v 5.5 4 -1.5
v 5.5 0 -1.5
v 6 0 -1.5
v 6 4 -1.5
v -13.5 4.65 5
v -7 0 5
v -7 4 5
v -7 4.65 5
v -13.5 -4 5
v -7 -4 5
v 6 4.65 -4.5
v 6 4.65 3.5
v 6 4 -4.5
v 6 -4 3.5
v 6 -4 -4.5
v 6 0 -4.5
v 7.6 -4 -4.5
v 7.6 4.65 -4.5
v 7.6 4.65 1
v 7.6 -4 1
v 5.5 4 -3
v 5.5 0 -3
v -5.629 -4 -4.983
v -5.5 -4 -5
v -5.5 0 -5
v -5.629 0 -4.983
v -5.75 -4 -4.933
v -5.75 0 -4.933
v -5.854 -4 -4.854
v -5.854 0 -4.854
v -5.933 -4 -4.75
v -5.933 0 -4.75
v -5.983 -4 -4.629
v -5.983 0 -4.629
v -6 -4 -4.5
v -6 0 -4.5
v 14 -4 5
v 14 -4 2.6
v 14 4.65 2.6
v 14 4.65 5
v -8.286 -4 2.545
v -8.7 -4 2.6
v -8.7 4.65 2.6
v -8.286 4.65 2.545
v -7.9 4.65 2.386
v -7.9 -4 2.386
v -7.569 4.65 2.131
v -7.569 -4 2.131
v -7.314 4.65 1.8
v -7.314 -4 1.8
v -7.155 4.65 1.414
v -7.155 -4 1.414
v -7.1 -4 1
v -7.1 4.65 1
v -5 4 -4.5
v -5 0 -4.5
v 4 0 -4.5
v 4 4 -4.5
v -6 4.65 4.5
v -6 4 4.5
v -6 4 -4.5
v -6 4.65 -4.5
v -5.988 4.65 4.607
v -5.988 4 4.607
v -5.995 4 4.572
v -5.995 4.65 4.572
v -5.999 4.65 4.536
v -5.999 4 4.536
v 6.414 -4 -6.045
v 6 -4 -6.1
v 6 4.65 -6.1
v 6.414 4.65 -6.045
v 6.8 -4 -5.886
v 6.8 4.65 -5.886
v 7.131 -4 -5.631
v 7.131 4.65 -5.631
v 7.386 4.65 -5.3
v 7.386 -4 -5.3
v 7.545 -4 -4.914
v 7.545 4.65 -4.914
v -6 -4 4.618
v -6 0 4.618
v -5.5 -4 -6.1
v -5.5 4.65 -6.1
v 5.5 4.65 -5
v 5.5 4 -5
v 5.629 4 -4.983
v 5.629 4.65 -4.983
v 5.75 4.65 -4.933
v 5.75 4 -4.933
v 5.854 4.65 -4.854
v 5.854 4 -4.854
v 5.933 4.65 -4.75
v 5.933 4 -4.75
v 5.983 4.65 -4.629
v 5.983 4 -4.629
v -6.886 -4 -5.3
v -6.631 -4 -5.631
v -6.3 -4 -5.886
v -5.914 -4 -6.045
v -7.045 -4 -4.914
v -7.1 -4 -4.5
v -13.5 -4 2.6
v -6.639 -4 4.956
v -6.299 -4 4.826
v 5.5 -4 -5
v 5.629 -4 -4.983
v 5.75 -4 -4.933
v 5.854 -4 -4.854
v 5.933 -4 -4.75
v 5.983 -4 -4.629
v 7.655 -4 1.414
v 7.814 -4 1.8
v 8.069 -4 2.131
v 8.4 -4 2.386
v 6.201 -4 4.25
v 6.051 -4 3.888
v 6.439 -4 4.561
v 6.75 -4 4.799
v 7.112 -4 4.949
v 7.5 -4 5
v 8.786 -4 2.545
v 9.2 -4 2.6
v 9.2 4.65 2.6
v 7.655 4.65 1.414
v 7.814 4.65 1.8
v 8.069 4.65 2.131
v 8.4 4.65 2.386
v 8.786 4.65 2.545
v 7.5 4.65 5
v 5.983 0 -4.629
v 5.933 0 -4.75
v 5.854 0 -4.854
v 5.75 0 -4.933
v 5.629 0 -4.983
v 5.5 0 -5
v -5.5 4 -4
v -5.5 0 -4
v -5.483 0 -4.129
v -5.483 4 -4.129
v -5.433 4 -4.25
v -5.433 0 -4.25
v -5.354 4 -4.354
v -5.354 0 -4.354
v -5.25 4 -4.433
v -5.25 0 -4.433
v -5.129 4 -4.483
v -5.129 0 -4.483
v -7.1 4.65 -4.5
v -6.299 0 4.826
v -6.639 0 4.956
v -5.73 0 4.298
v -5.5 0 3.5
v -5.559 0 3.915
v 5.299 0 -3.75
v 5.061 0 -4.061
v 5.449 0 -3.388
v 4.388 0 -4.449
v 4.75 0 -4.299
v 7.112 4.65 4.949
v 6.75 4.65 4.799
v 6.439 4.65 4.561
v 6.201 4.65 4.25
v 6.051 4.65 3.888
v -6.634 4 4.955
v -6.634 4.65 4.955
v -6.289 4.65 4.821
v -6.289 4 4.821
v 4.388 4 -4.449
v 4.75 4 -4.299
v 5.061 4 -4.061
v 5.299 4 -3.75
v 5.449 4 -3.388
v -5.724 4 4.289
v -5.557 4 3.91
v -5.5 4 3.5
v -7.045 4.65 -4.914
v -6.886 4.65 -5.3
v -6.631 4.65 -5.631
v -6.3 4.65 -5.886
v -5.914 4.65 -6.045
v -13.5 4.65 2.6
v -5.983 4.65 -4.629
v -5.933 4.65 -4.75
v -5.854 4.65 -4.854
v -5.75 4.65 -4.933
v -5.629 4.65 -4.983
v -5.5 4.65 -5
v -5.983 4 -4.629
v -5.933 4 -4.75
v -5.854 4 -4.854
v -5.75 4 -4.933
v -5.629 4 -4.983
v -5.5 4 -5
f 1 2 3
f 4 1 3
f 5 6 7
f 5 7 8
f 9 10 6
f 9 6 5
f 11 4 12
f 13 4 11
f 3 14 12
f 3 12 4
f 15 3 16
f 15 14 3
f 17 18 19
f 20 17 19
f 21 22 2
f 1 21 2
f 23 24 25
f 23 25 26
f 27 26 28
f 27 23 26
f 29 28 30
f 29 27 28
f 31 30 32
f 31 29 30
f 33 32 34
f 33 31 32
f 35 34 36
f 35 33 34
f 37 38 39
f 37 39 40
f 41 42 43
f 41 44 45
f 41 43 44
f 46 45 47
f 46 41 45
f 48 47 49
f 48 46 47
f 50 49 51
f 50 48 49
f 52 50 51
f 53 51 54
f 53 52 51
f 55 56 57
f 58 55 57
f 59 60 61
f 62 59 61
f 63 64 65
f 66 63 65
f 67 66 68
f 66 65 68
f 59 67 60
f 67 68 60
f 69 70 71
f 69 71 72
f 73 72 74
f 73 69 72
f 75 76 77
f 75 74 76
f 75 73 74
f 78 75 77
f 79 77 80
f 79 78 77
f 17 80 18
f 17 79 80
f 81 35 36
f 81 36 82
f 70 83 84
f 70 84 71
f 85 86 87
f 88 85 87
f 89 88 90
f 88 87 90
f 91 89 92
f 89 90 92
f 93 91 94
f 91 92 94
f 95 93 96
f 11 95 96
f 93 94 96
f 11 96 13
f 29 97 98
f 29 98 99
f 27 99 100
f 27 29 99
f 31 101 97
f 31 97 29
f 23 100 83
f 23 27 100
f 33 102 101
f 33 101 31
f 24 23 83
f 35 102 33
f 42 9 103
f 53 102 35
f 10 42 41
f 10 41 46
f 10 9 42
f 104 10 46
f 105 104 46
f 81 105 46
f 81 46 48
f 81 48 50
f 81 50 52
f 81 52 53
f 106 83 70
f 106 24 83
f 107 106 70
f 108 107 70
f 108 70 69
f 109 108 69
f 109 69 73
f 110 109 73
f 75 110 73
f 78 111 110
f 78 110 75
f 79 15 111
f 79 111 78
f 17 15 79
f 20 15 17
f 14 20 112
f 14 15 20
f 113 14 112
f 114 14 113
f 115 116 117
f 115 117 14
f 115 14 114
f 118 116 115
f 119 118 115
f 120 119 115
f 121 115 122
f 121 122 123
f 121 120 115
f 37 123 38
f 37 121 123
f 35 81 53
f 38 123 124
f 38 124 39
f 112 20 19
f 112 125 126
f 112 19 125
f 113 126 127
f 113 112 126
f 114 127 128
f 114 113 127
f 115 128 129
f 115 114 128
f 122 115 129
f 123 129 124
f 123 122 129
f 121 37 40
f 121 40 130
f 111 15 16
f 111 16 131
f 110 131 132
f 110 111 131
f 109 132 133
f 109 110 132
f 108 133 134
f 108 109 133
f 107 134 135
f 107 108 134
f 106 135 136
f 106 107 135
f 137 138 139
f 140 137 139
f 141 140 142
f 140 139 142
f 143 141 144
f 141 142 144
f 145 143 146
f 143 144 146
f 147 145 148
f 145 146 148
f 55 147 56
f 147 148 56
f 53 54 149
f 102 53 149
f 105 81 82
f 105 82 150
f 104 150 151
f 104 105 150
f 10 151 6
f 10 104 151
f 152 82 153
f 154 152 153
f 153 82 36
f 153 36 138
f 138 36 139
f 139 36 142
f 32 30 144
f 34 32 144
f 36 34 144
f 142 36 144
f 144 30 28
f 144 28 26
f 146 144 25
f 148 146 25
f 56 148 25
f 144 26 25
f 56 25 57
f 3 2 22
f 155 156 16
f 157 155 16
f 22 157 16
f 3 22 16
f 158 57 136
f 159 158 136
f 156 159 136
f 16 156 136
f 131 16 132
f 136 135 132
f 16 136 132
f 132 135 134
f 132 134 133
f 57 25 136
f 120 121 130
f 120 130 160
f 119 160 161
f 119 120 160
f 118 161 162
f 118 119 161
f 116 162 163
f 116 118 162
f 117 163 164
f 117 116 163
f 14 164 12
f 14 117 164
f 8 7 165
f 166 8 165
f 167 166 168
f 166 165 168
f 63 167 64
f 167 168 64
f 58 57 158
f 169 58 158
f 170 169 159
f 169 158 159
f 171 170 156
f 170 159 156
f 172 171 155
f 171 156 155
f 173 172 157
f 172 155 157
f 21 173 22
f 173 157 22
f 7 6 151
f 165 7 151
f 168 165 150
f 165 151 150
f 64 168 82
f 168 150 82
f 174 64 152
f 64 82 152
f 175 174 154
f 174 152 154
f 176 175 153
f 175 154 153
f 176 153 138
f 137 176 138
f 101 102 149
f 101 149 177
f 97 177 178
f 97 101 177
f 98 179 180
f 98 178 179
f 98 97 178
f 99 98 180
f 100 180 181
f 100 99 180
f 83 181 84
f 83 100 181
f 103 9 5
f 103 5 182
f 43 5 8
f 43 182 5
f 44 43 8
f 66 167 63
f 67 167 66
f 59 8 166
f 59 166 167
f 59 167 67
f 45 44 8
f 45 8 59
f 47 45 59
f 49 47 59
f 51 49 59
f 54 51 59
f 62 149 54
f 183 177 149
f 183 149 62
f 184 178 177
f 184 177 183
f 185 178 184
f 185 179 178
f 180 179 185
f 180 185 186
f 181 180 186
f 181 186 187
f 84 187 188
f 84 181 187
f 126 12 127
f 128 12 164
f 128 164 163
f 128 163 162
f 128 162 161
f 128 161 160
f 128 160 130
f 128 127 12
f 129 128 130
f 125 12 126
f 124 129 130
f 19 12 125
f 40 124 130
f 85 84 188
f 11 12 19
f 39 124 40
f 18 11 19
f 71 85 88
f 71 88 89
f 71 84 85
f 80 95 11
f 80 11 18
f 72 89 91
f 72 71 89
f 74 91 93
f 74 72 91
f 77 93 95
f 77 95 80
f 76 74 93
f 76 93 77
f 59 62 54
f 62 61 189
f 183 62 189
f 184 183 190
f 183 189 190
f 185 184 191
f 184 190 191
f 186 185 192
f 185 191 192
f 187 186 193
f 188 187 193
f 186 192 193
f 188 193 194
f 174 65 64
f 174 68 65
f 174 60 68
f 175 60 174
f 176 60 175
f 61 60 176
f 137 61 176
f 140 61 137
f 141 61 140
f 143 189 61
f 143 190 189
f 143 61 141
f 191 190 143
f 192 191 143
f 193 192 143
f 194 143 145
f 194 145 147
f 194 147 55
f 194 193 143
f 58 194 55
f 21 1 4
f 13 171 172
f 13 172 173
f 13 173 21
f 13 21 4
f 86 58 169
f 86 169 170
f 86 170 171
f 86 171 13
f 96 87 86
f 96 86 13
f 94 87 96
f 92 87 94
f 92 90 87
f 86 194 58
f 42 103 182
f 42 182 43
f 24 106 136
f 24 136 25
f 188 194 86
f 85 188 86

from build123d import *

# Parameters (mm, degrees)
BOSS_EXTRUDE1_DEPTH = 4
BOSS_EXTRUDE2_DEPTH = 0.65
BOSS_EXTRUDE3_START = 4
BOSS_EXTRUDE3_DEPTH = 4


with BuildPart() as part:
    # Sketch1 → Boss-Extrude1 (new body)
    with BuildSketch(Plane(origin=(0, 0, 0), x_dir=(1, 0, 0), z_dir=(0, 1, 0))):
        with BuildLine():
            Line((-5.5, -3.002039615), (-5.5, 4))
            ThreePointArc((-5.5, 4), (-5.353553391, 4.353553391), (-5, 4.5))
            Line((-5, 4.5), (4, 4.5))
            ThreePointArc((4, 4.5), (5.060660172, 4.060660172), (5.5, 3))
            Line((5.5, 3), (5.5, 1.5))
            Line((5.5, 1.5), (6, 1.5))
            Line((6, 1.5), (6, -3.5))
            ThreePointArc((6, -3.5), (6.439339828, -4.560660172), (7.5, -5))
            Line((7.5, -5), (14, -5))
            Line((14, -5), (14, -2.6))
            Line((14, -2.6), (9.2, -2.6))
            ThreePointArc((9.2, -2.6), (8.06862915, -2.13137085), (7.6, -1))
            Line((7.6, -1), (7.6, 4.5))
            ThreePointArc((7.6, 4.5), (7.13137085, 5.63137085), (6, 6.1))
            Line((6, 6.1), (-5.5, 6.1))
            ThreePointArc((-5.5, 6.1), (-6.63137085, 5.63137085), (-7.1, 4.5))
            Line((-7.1, 4.5), (-7.1, -1))
            ThreePointArc((-7.1, -1), (-7.56862915, -2.13137085), (-8.7, -2.6))
            Line((-8.7, -2.6), (-13.5, -2.6))
            Line((-13.5, -2.6), (-13.5, -5))
            Line((-13.5, -5), (-7, -5))
            ThreePointArc((-7, -5), (-5.939339828, -4.560660172), (-5.5, -3.5))
            Line((-5.5, -3.5), (-5.5, -3.002039615))
        make_face()
    extrude(amount=BOSS_EXTRUDE1_DEPTH)

    # Sketch2 → Boss-Extrude2 (add)
    with BuildSketch(Plane(origin=(0, 4, 0), x_dir=(1, 0, 0), z_dir=(0, 1, 0))):
        with BuildLine():
            Line((-13.5, -5), (-7, -5))
            ThreePointArc((-7, -5), (-6.457416135, -4.898428671), (-5.988313555, -4.607470332))
            ThreePointArc((-5.988313555, -4.607470332), (-5.997069803, -4.554051932), (-6, -4.5))
            Line((-6, -4.5), (-6, 4.5))
            ThreePointArc((-6, 4.5), (-5.853553391, 4.853553391), (-5.5, 5))
            Line((-5.5, 5), (5.5, 5))
            ThreePointArc((5.5, 5), (5.853553391, 4.853553391), (6, 4.5))
            Line((6, 4.5), (6, -3.5))
            ThreePointArc((6, -3.5), (6.439339828, -4.560660172), (7.5, -5))
            Line((7.5, -5), (14, -5))
            Line((14, -5), (14, -2.6))
            Line((14, -2.6), (9.2, -2.6))
            ThreePointArc((9.2, -2.6), (8.06862915, -2.13137085), (7.6, -1))
            Line((7.6, -1), (7.6, 4.5))
            ThreePointArc((7.6, 4.5), (7.13137085, 5.63137085), (6, 6.1))
            Line((6, 6.1), (-5.5, 6.1))
            ThreePointArc((-5.5, 6.1), (-6.63137085, 5.63137085), (-7.1, 4.5))
            Line((-7.1, 4.5), (-7.1, -1))
            ThreePointArc((-7.1, -1), (-7.56862915, -2.13137085), (-8.7, -2.6))
            Line((-8.7, -2.6), (-13.5, -2.6))
            Line((-13.5, -2.6), (-13.5, -5))
        make_face()
    extrude(amount=BOSS_EXTRUDE2_DEPTH)

    # Sketch3 → Boss-Extrude3 (add)
    with BuildSketch(Plane.XZ.offset(BOSS_EXTRUDE3_START)):
        with BuildLine():
            Line((7.6, -4.5), (7.6, 1))
            ThreePointArc((7.6, 1), (8.06862915, 2.13137085), (9.2, 2.6))
            Line((9.2, 2.6), (14, 2.6))
            Line((14, 2.6), (14, 5))
            Line((14, 5), (7.5, 5))
            ThreePointArc((7.5, 5), (6.439339828, 4.560660172), (6, 3.5))
            Line((6, 3.5), (6, 2.6))
            Line((6, 2.6), (6, -1.5))
            Line((6, -1.5), (6, -4.5))
            ThreePointArc((6, -4.5), (5.853553391, -4.853553391), (5.5, -5))
            Line((5.5, -5), (-5.5, -5))
            ThreePointArc((-5.5, -5), (-5.853553391, -4.853553391), (-6, -4.5))
            Line((-6, -4.5), (-6, 2.6))
            Line((-6, 2.6), (-6, 4.5))
            Line((-6, 4.5), (-6, 4.618033989))
            ThreePointArc((-6, 4.618033989), (-6.464766865, 4.901258538), (-7, 5))
            Line((-7, 5), (-13.5, 5))
            Line((-13.5, 5), (-13.5, 2.6))
            Line((-13.5, 2.6), (-8.7, 2.6))
            ThreePointArc((-8.7, 2.6), (-7.56862915, 2.13137085), (-7.1, 1))
            Line((-7.1, 1), (-7.1, -4.5))
            ThreePointArc((-7.1, -4.5), (-6.63137085, -5.63137085), (-5.5, -6.1))
            Line((-5.5, -6.1), (6, -6.1))
            ThreePointArc((6, -6.1), (7.13137085, -5.63137085), (7.6, -4.5))
        make_face()
    extrude(amount=-BOSS_EXTRUDE3_DEPTH)


solid = part.part
